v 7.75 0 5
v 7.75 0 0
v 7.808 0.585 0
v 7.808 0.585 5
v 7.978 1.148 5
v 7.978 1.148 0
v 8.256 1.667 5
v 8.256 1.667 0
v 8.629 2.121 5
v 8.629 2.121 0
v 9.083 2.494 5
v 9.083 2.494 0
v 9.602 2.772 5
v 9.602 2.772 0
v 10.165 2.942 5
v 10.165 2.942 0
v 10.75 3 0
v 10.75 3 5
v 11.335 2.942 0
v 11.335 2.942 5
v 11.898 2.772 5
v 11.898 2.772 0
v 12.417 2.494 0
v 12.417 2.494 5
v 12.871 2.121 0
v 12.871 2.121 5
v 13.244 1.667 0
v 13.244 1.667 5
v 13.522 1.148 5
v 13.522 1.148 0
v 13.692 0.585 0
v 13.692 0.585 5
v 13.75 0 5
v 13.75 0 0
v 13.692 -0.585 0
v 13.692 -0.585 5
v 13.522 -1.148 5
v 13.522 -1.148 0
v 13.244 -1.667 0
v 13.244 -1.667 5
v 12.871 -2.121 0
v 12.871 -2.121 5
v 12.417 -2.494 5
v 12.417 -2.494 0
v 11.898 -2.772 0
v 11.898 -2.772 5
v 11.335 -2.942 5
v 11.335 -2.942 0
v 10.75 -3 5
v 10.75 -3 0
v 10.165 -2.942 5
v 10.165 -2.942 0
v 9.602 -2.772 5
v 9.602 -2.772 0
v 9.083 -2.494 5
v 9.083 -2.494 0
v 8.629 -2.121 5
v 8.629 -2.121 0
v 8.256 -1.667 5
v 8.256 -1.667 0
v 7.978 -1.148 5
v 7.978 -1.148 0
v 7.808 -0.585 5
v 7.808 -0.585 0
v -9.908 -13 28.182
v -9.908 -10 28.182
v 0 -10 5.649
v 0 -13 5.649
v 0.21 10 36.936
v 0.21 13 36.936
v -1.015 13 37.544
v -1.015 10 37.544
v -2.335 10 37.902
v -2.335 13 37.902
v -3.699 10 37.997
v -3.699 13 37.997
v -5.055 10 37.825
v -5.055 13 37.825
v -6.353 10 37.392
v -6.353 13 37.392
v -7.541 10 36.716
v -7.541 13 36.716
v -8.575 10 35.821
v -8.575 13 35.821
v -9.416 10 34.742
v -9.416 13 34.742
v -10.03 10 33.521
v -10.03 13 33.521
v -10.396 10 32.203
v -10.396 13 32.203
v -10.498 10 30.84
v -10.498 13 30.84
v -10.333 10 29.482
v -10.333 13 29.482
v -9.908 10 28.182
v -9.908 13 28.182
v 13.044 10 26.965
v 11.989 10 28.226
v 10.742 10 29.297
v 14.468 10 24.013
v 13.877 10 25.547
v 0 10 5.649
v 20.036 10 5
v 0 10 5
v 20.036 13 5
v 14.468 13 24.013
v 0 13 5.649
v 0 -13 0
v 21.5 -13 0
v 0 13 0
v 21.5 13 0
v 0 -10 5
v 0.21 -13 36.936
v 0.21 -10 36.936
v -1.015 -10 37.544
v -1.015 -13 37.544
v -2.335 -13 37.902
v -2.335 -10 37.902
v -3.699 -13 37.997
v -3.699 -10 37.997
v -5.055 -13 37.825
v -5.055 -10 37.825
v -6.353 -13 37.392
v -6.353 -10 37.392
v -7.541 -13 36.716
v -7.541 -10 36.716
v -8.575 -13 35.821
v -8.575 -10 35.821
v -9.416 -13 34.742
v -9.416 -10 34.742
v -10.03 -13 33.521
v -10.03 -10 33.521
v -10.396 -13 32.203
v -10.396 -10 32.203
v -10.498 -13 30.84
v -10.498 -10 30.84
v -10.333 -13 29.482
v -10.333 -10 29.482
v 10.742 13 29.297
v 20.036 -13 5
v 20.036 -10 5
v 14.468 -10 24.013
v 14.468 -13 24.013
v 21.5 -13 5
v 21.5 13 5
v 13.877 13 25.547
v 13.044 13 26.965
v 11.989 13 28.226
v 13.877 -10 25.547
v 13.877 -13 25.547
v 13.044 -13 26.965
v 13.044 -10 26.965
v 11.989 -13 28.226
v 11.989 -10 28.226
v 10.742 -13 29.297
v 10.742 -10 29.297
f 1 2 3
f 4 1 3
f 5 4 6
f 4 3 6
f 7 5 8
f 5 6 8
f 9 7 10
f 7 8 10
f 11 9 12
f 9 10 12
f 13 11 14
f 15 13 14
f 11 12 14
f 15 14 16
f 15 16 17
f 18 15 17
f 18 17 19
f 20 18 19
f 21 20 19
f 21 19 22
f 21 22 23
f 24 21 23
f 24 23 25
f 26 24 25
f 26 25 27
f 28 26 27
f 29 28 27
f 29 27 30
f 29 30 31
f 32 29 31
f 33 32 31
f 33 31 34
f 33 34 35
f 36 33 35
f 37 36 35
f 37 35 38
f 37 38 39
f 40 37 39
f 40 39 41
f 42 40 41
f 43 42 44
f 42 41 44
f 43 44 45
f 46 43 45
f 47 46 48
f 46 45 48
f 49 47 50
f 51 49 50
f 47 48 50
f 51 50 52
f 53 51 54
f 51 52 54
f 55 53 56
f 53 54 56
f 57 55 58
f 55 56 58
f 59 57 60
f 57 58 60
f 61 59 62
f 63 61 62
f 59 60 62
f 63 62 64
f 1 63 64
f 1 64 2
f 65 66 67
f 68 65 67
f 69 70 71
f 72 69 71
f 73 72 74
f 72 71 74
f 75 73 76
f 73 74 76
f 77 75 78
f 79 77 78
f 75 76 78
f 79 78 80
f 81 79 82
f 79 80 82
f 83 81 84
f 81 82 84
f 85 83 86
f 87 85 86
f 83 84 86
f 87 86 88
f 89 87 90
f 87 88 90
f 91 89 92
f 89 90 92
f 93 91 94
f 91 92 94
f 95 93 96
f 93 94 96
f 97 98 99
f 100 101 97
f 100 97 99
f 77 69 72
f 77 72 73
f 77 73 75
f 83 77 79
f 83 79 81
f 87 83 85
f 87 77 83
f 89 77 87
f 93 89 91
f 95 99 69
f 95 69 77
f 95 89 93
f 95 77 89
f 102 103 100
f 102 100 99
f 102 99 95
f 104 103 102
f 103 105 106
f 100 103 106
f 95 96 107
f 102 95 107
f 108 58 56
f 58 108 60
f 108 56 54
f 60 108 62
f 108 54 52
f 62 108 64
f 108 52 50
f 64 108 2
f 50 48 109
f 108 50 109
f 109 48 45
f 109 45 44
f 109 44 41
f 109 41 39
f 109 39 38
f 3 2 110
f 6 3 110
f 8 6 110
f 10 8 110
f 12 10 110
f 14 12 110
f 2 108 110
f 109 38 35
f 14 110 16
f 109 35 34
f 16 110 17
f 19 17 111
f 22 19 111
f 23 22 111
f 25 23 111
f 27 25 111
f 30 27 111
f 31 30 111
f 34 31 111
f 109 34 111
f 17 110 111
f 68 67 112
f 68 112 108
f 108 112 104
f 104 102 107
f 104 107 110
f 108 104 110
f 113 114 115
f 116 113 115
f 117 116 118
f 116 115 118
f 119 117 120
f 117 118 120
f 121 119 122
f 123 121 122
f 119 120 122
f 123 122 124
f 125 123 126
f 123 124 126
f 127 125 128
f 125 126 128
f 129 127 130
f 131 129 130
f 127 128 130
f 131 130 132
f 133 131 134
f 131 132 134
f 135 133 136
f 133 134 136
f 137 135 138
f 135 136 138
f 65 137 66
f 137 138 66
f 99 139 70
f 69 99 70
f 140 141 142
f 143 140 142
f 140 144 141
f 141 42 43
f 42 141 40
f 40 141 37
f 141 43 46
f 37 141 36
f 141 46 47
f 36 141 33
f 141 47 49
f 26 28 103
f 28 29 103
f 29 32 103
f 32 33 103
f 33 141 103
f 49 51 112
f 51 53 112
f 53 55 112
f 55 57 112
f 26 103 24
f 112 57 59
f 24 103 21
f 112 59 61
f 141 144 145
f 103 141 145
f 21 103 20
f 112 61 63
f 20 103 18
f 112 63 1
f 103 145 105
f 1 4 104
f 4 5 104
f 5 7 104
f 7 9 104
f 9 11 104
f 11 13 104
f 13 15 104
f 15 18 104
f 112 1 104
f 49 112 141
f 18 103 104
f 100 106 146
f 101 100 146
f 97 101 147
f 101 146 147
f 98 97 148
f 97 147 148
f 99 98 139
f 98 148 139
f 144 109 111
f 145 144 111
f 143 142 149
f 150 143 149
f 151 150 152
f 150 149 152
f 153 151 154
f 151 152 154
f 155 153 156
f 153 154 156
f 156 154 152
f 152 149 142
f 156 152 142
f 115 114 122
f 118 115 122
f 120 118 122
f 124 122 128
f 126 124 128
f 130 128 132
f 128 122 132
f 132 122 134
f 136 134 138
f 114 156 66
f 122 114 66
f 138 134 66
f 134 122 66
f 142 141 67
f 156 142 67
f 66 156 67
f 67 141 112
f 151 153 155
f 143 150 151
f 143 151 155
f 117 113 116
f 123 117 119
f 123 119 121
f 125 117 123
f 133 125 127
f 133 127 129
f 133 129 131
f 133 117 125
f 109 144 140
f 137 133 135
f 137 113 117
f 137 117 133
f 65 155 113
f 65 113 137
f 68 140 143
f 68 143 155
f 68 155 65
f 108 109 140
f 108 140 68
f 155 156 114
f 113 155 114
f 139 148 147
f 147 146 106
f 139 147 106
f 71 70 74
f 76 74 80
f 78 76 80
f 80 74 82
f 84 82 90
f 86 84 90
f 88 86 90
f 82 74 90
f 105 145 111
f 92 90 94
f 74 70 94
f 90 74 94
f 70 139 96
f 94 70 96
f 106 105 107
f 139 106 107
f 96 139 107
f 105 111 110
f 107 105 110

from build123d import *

# Parameters (mm, degrees)
BOSS_EXTRUDE1_DEPTH = 13
CUT_EXTRUDE1_DEPTH  = 10
SKETCH4_W           = 21.5
SKETCH4_H           = 26
BOSS_EXTRUDE2_DEPTH = 5
SKETCH5_R           = 3
CUT_EXTRUDE2_DEPTH  = 46.55491192


with BuildPart() as part:
    # Sketch1 → Boss-Extrude1 (new, symmetric)
    with BuildSketch(Plane(origin=(0, 0, 0), x_dir=(1, 0, 0), z_dir=(0, 1, 0))):
        with BuildLine():
            Line((0, 0), (21.5, 0))
            Line((21.5, 0), (14.467721765, -24.012898335))
            ThreePointArc((14.467721765, -24.012898335), (13.043725458, -26.964613514), (10.741924274, -29.297444262))
            Line((10.741924274, -29.297444262), (0.20999258, -36.935988128))
            ThreePointArc((0.20999258, -36.935988128), (-8.079954607, -36.293771416), (-9.907897405, -28.182403357))
            Line((-9.907897405, -28.182403357), (0, -5.649444205))
            Line((0, -5.649444205), (0, 0))
        make_face()
    extrude(amount=BOSS_EXTRUDE1_DEPTH, both=True)

    # Sketch1<2> → Cut-Extrude1 (cut, symmetric)
    with BuildSketch(Plane(origin=(0, 0, 0), x_dir=(1, 0, 0), z_dir=(0, 1, 0))):
        with BuildLine():
            Line((0, 0), (21.5, 0))
            Line((21.5, 0), (14.467721765, -24.012898335))
            ThreePointArc((14.467721765, -24.012898335), (13.043725458, -26.964613514), (10.741924274, -29.297444262))
            Line((10.741924274, -29.297444262), (0.20999258, -36.935988128))
            ThreePointArc((0.20999258, -36.935988128), (-8.079954607, -36.293771416), (-9.907897405, -28.182403357))
            Line((-9.907897405, -28.182403357), (0, -5.649444205))
            Line((0, -5.649444205), (0, 0))
        make_face()
    extrude(amount=CUT_EXTRUDE1_DEPTH, both=True, mode=Mode.SUBTRACT)


with BuildPart() as cut_extrude1_piece_1:
    # of the separate pieces the step leaves, piece 1, a body of its own (cut_extrude1_pieces)
    add(part.part.solids().sort_by_distance((10.741924274, -13, 29.297444262))[0])



with BuildPart() as cut_extrude1_piece_2:
    # of the separate pieces the step leaves, piece 2, a body of its own (cut_extrude1_pieces)
    add(part.part.solids().sort_by_distance((10.741924274, 10, 29.297444262))[0])


with BuildPart() as cut_extrude1_piece_1_1:
    add(cut_extrude1_piece_1.part)

    add(cut_extrude1_piece_2.part)  # Boss-Extrude2 merges Cut-Extrude1 piece 2
    # Sketch4 → Boss-Extrude2 (add)
    with BuildSketch(Plane(origin=(0, 0, 0), x_dir=(-1, 0, 0), z_dir=(0, 0, -1))):
        with Locations((-10.75, 0)):
            Rectangle(SKETCH4_W, SKETCH4_H)
    extrude(amount=-BOSS_EXTRUDE2_DEPTH)

    # Sketch5 → Cut-Extrude2 (cut, through all)
    with BuildSketch(Plane(origin=(0, 0, 0), x_dir=(-1, 0, 0), z_dir=(0, 0, -1))):
        with Locations((-10.75, 0)):
            Circle(SKETCH5_R)
    extrude(amount=-CUT_EXTRUDE2_DEPTH, mode=Mode.SUBTRACT)


solid = cut_extrude1_piece_1_1.part
